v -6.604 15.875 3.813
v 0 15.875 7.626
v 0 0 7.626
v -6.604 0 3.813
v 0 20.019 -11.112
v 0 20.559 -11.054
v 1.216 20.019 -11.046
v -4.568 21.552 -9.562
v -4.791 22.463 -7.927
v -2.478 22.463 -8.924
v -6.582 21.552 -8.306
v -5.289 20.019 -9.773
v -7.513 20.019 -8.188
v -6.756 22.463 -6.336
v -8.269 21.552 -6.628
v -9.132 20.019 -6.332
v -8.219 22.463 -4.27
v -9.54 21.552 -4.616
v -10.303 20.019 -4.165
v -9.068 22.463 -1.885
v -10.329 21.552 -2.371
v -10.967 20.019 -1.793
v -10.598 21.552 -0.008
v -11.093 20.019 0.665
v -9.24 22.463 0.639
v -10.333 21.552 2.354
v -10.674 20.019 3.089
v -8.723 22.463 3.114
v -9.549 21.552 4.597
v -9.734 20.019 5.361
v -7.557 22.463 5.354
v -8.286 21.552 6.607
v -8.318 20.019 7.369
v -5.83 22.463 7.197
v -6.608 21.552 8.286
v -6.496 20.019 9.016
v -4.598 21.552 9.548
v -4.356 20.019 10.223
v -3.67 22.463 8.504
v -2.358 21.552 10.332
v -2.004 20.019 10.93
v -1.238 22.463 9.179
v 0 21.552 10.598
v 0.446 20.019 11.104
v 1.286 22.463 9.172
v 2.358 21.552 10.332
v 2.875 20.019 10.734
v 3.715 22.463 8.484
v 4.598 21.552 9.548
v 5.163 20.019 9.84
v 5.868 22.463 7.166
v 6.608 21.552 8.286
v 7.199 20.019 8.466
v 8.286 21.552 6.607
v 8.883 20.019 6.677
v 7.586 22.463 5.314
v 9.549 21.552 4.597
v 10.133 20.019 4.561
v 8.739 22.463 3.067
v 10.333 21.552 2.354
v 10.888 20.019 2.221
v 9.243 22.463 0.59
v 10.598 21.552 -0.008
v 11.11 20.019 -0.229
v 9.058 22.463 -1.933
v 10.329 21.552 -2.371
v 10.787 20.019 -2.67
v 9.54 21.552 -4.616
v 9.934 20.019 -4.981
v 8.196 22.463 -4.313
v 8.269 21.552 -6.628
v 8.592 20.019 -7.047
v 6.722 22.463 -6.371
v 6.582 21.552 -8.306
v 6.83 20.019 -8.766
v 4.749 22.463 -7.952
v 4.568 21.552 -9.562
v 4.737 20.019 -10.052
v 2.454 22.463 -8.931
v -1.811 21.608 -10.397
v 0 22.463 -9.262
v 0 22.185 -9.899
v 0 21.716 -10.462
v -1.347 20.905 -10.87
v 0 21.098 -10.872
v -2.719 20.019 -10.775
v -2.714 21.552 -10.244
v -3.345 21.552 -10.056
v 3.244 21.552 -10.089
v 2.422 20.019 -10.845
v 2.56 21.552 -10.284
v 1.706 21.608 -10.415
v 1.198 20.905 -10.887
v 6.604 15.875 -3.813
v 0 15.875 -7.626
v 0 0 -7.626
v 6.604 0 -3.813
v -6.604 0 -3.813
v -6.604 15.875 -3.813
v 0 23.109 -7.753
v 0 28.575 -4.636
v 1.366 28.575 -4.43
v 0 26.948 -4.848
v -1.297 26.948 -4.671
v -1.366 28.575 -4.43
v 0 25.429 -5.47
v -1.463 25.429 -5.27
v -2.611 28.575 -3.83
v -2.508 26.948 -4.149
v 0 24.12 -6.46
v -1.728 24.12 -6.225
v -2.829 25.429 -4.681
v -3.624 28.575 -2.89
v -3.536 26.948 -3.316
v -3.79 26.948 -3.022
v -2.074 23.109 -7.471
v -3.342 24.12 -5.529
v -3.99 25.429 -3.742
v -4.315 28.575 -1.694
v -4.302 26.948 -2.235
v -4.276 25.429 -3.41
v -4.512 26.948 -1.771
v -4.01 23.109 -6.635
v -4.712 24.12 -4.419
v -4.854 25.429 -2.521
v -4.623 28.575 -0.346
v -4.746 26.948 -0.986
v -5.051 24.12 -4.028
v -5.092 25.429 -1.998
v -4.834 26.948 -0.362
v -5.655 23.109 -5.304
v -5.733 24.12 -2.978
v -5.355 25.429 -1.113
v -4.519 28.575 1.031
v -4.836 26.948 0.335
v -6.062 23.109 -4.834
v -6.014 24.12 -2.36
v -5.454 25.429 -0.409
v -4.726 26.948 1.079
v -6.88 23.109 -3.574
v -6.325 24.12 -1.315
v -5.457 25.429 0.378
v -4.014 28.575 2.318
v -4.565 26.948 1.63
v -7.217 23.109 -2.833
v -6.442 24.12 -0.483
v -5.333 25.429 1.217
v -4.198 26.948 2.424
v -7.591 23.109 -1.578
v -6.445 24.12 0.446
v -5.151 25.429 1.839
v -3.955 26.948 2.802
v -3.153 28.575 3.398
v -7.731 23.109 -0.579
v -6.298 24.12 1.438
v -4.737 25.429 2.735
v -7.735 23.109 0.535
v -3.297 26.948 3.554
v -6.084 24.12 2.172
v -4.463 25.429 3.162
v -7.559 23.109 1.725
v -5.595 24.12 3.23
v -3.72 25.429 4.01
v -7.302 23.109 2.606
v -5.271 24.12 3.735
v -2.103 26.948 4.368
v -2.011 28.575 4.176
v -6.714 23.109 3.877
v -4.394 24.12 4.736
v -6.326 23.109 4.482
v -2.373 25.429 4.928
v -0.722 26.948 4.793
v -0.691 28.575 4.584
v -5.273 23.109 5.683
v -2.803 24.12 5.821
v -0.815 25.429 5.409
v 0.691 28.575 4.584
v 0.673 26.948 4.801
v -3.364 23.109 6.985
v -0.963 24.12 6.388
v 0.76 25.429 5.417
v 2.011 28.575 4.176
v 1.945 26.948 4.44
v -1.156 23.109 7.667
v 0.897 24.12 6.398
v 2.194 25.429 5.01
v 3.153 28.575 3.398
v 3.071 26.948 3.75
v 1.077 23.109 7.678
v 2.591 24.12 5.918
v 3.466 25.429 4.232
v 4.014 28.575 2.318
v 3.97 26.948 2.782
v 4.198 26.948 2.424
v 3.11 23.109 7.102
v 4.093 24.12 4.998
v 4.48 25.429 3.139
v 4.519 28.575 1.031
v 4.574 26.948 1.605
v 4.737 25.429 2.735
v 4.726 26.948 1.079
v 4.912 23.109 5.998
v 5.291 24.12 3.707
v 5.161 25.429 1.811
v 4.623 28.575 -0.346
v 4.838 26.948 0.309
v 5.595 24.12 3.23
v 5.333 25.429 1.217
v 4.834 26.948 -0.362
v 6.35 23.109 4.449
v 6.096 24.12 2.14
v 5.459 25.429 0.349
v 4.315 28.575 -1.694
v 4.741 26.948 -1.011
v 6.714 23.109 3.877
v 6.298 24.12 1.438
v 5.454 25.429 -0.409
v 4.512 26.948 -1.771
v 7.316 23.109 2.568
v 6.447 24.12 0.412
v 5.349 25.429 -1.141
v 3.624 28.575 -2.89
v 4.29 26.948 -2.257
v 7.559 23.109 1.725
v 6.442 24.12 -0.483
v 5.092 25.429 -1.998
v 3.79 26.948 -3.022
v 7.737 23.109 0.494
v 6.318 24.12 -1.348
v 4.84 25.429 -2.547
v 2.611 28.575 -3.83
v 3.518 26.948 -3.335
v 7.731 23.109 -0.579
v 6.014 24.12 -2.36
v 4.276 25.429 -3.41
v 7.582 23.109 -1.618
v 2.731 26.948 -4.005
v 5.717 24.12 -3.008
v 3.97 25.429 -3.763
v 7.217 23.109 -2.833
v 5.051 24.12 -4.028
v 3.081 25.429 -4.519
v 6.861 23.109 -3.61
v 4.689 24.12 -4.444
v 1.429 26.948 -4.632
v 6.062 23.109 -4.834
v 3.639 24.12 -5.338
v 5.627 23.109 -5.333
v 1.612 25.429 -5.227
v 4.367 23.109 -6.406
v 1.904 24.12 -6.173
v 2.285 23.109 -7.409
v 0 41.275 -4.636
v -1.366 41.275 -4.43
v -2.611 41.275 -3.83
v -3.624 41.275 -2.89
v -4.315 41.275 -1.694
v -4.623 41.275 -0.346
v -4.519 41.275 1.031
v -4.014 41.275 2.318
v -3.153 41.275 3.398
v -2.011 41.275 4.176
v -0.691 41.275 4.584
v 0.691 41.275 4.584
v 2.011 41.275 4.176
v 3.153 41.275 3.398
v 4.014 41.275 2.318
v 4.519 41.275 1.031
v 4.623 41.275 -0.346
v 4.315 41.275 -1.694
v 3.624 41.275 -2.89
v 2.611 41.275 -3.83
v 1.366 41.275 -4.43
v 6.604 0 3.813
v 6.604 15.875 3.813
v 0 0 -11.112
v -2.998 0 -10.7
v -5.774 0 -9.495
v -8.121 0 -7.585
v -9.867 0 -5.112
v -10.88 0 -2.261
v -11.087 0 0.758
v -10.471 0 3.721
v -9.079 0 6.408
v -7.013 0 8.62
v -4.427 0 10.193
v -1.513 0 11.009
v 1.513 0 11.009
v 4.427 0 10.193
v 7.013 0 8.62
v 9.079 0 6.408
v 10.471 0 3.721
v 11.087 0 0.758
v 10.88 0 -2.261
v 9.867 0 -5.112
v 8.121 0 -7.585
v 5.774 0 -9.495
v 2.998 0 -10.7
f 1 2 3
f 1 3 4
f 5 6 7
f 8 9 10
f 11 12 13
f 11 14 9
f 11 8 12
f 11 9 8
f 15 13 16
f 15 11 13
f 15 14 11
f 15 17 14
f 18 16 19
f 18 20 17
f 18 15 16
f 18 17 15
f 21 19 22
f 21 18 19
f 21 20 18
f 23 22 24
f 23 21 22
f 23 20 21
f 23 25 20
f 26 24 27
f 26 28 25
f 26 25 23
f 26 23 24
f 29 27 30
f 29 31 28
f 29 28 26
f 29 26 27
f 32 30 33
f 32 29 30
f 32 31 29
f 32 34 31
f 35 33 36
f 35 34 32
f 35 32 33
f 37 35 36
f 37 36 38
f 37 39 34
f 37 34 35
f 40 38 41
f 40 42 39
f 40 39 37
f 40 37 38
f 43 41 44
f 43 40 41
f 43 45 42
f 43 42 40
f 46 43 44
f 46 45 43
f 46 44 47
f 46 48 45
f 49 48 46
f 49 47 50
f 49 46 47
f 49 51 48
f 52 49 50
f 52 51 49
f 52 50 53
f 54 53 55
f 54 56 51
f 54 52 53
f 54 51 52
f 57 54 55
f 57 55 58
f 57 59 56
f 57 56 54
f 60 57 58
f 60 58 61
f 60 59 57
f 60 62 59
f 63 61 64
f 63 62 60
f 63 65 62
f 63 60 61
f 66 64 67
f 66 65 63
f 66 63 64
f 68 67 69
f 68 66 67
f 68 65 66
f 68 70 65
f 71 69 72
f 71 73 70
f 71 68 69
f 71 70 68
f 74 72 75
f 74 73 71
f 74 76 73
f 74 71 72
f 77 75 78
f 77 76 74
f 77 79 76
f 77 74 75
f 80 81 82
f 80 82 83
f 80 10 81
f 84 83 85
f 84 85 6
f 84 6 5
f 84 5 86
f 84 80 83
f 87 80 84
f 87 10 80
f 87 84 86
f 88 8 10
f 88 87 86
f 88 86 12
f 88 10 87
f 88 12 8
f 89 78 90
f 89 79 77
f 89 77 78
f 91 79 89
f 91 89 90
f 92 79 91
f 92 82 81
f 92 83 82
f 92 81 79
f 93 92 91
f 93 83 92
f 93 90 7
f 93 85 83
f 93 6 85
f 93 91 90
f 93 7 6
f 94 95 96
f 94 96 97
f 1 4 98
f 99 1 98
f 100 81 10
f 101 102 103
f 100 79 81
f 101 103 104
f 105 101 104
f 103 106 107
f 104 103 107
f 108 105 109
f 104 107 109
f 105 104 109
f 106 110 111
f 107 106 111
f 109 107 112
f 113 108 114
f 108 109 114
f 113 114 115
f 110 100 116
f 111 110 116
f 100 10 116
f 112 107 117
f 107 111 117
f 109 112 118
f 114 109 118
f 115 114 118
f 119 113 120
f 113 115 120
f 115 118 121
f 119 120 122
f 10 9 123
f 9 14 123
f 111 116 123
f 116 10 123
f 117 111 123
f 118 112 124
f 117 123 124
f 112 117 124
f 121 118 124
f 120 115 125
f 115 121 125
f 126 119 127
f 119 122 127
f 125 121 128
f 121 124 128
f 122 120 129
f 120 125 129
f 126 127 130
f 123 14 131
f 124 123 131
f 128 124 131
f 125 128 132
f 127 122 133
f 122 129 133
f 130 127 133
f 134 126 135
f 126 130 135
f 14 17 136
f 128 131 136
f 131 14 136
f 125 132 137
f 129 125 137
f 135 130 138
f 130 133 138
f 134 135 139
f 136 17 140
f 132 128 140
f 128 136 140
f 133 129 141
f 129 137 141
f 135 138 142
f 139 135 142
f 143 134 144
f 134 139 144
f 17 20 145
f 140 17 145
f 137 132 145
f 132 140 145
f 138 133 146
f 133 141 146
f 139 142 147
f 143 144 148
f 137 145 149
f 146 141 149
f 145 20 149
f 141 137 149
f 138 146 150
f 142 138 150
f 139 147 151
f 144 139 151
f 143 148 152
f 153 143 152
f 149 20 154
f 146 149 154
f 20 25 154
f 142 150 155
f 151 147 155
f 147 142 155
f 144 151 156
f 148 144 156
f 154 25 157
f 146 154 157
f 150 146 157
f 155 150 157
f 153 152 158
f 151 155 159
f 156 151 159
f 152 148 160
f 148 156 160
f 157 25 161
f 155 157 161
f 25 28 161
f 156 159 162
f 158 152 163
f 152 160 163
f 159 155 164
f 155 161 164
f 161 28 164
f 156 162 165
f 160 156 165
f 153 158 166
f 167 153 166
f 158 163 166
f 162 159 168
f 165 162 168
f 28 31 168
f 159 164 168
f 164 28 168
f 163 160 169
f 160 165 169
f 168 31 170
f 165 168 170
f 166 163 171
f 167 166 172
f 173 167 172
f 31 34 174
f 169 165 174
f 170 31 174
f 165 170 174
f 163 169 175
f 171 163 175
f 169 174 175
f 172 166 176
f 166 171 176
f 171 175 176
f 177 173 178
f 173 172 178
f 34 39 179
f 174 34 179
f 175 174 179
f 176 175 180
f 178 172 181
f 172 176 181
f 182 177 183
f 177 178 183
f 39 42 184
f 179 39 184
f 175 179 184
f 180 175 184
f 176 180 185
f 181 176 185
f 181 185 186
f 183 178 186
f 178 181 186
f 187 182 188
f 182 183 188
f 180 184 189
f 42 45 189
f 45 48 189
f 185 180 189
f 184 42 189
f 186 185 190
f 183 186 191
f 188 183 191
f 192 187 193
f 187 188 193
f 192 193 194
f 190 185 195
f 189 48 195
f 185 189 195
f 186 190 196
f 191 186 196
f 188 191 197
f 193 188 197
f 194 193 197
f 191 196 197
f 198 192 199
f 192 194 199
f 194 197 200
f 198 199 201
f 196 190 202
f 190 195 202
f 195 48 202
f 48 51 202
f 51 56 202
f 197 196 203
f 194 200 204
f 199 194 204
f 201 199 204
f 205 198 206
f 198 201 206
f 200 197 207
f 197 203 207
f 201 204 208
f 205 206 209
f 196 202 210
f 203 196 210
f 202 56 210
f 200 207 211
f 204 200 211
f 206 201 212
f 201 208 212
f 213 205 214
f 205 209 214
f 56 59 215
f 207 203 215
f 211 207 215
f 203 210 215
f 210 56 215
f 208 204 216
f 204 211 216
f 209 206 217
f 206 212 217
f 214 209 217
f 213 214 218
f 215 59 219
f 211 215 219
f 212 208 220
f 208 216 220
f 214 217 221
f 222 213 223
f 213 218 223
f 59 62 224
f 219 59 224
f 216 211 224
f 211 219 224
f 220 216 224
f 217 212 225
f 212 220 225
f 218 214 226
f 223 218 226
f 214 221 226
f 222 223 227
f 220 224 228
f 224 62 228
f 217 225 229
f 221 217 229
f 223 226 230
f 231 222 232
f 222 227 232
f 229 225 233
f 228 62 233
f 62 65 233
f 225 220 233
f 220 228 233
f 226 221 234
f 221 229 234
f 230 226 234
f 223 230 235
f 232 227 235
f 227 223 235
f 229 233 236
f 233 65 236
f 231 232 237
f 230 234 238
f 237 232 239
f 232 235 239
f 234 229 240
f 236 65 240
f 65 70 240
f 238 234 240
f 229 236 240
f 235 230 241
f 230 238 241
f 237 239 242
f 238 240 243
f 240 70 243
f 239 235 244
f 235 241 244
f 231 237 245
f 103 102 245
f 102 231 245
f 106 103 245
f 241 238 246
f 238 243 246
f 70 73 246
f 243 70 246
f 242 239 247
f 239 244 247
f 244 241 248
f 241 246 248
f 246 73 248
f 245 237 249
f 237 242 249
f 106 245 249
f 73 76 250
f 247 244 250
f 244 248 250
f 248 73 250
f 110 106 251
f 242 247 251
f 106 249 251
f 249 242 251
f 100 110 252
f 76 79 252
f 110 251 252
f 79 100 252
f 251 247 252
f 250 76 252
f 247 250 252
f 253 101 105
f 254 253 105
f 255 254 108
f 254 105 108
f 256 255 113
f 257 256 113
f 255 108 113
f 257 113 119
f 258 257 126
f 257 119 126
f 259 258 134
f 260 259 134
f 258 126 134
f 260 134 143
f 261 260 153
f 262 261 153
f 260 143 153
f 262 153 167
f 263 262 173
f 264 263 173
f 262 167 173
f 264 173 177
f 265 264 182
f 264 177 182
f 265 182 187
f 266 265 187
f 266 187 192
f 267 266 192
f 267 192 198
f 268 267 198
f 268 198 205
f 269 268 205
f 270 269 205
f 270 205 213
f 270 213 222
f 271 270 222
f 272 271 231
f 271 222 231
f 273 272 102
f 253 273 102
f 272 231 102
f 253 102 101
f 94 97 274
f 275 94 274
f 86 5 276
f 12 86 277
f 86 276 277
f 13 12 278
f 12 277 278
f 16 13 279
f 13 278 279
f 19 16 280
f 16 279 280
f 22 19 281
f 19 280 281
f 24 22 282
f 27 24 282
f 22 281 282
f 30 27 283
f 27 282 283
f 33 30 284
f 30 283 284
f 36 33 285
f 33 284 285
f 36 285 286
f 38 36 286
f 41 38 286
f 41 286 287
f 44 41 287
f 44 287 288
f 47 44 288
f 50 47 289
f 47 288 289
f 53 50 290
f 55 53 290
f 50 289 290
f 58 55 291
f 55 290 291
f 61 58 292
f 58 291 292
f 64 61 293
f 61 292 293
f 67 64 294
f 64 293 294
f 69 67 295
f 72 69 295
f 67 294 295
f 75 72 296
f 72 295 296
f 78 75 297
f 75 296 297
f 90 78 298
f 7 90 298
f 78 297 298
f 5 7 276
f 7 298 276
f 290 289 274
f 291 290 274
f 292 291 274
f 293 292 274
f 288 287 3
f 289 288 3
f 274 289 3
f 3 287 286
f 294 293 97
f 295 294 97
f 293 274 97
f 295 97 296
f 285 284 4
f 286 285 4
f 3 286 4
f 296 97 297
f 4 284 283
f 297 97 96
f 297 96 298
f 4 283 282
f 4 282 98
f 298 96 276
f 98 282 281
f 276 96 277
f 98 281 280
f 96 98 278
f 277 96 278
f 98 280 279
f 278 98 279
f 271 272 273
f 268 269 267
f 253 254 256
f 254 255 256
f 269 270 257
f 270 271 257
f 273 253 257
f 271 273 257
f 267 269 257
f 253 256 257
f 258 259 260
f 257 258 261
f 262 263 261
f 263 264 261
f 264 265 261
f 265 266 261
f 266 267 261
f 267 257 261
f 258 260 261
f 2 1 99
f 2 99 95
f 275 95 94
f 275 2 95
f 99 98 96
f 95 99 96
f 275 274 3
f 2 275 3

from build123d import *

# Parameters (mm, degrees)
CUT_EXTRUDE1_DEPTH = 15.875
FILLET1_R          = 6.35
FILLET2_R          = 2.54


with BuildPart() as part:
    # Sketch1 → Revolve1 (revolve)
    with BuildSketch(Plane.XY, mode=Mode.PRIVATE) as revolve1_sk:
        Polygon((0, 41.275), (4.6355, 41.275), (4.6355, 22.225), (11.1125, 22.225), (11.1125, 0), (0, 0), align=None)
    revolve(revolve1_sk.sketch.rotate(Axis((0, 0, 0), (0, 1, 0)), 90), axis=Axis((0, 0, 0), (0, 1, 0)))

    # Sketch2 → Cut-Extrude1 (cut)
    with BuildSketch(Plane.XZ):
        Polygon((6.604, 3.812821178), (0, 7.625642355), (-6.604, 3.812821178), (-6.604, -3.812821178), (0, -7.625642355), (6.604, -3.812821178), align=None)
    extrude(amount=-CUT_EXTRUDE1_DEPTH, mode=Mode.SUBTRACT)

    # Fillet1
    fillet1_edges = [part.edges().sort_by_distance(p)[0] for p in [
        (0, 22.225, 4.6355),
    ]]
    fillet(fillet1_edges, radius=FILLET1_R)

    # Fillet2
    fillet2_edges = [part.edges().sort_by_distance(p)[0] for p in [
        (0, 22.225, 11.1125),
    ]]
    fillet(fillet2_edges, radius=FILLET2_R)


solid = part.part
